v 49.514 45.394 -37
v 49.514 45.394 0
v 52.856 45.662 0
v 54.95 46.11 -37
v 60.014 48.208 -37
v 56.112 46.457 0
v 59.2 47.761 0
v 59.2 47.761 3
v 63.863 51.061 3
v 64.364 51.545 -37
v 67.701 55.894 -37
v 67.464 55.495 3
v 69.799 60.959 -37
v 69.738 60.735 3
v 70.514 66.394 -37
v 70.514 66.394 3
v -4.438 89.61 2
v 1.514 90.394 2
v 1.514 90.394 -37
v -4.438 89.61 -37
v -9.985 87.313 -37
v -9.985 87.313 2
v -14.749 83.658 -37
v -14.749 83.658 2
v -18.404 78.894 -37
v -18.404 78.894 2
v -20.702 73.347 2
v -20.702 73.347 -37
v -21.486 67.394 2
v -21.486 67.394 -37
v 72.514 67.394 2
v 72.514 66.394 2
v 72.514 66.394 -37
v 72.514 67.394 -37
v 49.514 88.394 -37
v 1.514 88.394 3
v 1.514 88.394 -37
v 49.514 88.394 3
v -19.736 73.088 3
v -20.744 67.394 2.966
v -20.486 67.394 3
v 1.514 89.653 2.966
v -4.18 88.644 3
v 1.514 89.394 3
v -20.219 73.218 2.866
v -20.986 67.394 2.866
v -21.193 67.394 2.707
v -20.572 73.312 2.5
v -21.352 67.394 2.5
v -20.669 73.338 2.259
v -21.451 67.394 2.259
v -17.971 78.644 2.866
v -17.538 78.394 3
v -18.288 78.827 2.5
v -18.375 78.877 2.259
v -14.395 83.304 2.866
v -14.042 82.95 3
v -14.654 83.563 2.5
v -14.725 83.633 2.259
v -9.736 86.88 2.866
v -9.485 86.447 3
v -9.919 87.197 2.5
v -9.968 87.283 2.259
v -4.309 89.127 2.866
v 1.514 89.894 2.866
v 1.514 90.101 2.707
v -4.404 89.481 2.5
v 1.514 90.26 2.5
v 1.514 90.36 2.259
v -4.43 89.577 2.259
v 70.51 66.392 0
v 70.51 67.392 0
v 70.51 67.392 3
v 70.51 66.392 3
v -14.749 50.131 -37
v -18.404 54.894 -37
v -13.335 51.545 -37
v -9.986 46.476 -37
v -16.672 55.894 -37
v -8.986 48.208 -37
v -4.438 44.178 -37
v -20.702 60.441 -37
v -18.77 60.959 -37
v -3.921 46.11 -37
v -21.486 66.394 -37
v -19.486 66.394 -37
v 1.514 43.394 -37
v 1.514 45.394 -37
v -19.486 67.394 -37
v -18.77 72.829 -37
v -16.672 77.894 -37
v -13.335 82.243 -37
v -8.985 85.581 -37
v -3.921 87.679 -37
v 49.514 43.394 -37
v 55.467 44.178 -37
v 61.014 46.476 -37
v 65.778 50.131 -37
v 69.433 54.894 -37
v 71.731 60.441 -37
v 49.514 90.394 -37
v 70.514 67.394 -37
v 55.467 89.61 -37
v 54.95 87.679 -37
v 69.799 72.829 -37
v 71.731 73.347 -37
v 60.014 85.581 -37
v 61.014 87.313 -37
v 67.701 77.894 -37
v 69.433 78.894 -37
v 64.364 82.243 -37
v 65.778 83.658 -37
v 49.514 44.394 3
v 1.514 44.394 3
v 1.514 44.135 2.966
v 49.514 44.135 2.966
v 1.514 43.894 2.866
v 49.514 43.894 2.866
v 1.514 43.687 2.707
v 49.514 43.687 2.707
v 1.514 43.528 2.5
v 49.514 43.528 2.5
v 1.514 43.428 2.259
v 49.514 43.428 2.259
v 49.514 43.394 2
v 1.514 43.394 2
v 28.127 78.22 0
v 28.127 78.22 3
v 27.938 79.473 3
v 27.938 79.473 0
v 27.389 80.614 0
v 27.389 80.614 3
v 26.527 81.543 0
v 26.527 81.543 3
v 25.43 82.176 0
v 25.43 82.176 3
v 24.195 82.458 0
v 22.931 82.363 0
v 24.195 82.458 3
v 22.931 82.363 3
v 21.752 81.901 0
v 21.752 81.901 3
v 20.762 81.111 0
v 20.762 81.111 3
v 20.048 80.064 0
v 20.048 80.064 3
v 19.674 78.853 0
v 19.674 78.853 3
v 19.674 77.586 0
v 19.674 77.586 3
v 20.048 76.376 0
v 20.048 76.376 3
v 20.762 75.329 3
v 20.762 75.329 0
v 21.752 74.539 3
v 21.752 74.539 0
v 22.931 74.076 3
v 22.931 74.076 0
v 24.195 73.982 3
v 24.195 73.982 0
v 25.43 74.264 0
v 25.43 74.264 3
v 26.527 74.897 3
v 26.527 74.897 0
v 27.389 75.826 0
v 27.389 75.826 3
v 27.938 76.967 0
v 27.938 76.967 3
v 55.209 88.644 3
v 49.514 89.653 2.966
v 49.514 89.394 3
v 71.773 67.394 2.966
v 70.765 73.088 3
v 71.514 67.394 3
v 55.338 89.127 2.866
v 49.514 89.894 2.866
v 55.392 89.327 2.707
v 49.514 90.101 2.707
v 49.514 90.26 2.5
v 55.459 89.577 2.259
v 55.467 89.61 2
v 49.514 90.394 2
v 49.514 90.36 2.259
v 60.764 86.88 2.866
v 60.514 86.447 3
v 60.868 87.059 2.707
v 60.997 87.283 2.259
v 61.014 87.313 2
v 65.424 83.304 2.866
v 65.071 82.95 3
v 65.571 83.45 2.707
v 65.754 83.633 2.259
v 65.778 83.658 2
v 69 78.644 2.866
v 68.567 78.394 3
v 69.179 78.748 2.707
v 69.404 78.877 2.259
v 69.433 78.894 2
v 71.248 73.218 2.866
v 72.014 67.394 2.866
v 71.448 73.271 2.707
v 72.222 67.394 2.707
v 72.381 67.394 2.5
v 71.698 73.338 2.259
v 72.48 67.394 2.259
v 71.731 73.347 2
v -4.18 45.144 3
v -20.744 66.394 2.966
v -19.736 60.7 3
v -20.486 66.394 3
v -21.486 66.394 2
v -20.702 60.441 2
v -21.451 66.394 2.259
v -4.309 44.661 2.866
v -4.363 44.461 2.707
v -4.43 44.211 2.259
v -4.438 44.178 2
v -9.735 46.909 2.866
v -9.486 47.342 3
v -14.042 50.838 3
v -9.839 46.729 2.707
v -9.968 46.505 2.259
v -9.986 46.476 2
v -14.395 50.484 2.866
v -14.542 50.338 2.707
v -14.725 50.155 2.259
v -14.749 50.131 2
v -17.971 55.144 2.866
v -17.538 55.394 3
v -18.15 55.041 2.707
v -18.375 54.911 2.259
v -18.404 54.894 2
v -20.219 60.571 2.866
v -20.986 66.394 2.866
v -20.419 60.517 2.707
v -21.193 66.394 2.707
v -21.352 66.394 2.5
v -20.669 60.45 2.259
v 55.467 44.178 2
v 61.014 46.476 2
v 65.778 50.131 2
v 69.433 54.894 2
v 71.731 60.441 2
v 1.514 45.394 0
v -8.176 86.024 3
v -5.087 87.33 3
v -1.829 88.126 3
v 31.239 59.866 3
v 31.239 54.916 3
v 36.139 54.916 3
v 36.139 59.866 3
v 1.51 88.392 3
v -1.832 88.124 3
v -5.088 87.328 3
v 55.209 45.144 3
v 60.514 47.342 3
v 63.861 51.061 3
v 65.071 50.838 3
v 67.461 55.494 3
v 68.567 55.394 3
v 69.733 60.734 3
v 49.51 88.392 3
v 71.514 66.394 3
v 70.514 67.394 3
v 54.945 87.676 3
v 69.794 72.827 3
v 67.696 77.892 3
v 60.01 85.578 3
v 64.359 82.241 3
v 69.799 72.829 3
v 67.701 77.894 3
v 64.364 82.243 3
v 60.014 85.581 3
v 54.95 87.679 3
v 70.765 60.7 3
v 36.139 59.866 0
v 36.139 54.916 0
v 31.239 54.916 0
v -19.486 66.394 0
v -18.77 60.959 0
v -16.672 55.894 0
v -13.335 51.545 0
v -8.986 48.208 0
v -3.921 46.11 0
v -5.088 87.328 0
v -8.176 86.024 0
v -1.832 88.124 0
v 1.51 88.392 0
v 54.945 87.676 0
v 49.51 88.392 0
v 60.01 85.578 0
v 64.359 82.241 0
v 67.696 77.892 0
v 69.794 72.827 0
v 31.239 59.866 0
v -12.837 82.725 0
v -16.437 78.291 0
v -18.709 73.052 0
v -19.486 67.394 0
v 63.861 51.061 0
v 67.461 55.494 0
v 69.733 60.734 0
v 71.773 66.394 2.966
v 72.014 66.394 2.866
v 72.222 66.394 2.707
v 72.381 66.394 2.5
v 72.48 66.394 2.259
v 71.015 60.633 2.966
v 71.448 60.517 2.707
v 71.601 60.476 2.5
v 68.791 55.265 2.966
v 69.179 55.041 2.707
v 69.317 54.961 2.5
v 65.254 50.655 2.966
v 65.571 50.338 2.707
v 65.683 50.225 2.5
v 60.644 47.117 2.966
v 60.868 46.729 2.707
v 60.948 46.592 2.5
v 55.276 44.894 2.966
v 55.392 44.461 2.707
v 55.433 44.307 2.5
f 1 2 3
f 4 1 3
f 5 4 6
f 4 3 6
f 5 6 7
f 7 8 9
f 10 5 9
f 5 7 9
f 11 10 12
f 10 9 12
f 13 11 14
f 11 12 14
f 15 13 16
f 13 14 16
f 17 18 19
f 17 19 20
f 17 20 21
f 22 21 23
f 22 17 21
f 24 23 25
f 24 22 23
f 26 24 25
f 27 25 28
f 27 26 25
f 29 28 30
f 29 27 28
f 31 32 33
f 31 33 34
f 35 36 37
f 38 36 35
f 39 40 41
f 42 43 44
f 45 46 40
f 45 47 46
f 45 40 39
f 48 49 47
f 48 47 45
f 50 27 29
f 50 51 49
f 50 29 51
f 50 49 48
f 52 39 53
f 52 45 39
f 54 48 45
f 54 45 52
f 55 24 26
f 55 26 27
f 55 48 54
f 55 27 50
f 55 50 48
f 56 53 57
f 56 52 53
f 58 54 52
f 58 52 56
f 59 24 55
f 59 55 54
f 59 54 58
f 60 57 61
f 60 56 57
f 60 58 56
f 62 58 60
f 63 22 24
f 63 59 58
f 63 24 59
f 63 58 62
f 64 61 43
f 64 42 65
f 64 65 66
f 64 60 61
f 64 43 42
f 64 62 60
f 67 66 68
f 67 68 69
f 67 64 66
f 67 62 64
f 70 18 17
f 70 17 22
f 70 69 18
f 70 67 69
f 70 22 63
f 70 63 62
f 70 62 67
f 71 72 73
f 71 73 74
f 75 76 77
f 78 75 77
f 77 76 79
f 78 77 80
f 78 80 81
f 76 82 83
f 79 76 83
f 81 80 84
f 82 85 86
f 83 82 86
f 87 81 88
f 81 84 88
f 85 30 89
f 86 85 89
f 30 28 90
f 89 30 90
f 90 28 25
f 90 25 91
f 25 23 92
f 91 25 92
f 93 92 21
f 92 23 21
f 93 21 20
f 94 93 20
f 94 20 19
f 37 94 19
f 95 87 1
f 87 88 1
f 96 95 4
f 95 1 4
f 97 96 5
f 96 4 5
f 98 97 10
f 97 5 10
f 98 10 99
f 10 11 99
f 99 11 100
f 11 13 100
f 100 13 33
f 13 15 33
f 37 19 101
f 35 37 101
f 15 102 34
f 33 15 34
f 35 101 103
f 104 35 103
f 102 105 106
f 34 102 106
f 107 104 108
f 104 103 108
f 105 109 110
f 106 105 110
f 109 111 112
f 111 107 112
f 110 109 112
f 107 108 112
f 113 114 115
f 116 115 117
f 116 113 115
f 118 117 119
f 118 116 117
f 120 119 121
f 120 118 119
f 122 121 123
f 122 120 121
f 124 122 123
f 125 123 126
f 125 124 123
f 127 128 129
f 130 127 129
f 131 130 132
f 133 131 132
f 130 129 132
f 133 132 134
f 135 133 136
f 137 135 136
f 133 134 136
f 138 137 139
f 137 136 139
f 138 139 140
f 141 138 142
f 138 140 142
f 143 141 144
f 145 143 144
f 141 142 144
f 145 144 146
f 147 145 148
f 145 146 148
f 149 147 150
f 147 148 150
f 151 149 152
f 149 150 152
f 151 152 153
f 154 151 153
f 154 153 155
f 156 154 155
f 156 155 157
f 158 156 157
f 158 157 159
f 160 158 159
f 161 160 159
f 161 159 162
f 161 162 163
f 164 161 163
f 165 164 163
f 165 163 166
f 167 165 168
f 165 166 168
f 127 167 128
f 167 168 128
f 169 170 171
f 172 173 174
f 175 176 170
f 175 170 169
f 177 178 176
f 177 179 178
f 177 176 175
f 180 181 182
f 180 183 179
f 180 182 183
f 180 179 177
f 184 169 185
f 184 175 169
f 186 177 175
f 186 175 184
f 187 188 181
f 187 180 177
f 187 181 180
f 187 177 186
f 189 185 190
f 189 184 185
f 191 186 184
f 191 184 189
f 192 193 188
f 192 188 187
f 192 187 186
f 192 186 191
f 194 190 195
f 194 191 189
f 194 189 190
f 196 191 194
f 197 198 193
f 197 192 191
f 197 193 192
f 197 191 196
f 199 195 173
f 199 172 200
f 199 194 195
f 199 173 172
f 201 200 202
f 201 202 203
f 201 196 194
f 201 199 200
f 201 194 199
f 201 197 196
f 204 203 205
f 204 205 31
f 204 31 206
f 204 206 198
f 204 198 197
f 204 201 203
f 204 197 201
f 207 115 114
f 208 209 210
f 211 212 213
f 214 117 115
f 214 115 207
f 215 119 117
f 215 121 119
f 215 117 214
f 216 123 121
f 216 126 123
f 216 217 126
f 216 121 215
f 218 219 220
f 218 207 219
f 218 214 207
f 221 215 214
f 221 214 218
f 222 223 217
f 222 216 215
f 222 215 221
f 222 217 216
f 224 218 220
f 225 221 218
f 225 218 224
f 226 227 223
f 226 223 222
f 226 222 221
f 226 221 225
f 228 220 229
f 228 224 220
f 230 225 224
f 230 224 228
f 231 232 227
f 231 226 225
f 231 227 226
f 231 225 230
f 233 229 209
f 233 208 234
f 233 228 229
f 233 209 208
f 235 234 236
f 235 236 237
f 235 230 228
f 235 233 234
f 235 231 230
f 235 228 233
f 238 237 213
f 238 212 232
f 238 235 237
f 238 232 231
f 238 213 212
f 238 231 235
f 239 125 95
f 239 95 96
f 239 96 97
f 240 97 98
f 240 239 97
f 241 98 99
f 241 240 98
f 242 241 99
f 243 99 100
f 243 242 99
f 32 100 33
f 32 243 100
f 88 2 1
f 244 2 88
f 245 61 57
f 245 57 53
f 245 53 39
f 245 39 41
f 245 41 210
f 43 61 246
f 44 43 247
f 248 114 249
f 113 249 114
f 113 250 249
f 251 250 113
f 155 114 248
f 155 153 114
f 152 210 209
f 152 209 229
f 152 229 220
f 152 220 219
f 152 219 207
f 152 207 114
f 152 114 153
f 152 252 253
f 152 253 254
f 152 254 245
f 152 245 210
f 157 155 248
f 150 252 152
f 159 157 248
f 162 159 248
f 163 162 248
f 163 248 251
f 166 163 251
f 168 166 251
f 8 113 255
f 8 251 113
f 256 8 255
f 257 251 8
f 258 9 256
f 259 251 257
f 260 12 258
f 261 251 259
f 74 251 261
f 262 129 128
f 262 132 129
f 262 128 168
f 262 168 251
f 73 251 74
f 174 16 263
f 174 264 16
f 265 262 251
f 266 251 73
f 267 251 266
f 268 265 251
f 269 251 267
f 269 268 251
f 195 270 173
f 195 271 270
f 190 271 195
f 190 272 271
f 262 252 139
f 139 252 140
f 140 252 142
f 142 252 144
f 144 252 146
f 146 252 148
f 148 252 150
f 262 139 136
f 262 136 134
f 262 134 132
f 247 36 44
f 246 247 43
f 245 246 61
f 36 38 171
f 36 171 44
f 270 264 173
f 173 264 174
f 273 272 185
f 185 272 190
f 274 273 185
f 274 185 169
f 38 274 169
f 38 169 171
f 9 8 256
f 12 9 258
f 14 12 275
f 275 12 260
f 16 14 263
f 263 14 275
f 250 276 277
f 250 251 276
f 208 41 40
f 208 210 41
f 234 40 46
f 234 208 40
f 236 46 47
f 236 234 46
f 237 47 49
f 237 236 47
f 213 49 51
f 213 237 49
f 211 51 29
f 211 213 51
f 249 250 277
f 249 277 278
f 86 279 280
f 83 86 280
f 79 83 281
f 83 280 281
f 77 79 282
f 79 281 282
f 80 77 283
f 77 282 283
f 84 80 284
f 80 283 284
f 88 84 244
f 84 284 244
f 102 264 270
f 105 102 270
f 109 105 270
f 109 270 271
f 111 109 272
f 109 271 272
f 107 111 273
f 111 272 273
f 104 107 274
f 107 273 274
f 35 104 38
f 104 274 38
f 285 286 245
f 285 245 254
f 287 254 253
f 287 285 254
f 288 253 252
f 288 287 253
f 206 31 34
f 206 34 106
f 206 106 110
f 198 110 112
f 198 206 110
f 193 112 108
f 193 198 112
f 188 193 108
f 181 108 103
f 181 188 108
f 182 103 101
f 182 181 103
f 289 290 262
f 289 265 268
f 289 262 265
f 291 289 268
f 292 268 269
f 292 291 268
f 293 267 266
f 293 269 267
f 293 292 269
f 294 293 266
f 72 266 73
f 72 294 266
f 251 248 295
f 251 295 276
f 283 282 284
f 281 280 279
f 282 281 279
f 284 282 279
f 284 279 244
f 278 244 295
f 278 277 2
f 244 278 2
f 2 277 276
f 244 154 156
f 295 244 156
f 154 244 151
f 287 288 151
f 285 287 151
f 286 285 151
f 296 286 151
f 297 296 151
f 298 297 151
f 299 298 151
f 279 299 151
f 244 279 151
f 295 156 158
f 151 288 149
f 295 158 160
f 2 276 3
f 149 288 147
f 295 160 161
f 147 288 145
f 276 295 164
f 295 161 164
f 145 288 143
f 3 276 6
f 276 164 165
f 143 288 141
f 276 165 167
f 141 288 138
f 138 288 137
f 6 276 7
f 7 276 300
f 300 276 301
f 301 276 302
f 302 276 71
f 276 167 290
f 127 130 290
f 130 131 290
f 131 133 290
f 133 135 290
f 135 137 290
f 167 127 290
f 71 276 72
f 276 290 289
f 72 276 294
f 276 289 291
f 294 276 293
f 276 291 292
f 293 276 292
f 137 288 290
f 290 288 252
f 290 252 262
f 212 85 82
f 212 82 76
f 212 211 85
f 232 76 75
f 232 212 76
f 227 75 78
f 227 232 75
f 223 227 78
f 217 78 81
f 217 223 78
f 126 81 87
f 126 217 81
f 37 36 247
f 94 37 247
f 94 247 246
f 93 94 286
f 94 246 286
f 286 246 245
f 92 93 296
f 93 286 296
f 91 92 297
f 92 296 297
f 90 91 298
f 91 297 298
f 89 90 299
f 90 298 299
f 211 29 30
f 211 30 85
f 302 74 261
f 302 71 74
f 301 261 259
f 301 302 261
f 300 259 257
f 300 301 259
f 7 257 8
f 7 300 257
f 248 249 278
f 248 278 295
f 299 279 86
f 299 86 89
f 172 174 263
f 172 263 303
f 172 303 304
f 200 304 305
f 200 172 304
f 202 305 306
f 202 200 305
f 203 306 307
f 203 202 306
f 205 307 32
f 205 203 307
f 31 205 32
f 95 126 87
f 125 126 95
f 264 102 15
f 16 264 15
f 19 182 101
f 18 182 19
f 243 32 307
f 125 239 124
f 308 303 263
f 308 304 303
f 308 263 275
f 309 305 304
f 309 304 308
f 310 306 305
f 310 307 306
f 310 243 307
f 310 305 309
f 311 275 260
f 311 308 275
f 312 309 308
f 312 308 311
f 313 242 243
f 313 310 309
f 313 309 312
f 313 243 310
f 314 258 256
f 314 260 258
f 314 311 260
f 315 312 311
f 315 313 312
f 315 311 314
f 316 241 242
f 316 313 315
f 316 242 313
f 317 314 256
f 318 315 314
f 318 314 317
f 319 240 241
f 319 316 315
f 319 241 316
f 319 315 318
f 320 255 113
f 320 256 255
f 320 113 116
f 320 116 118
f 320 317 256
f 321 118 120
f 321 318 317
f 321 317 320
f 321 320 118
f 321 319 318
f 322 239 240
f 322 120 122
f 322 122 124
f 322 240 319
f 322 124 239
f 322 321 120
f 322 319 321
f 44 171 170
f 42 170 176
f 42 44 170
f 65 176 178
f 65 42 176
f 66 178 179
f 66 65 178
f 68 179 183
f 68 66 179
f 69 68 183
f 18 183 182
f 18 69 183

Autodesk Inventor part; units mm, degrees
ref_plane "YZ Plane" through (0, 0, 0) normal (1, 0, 0) x (0, 1, 0)
ref_plane "XZ Plane" through (0, 0, 0) normal (0, 1, 0) x (-1, 0, 0)
ref_plane "XY Plane" through (0, 0, 0) normal (0, 0, 1) x (1, 0, 0)
sketch "Sketch1" plane through (0, 0, 0) normal (0, 0, 1) x (1, 0, 0)
  line L0 (1.5095, 88.3915) -> (49.5095, 88.3915)
  line L1 (70.5095, 67.3915) -> (70.5095, 66.3915)
  line L2 (49.5095, 45.3915) -> (1.5095, 45.3915)
  line L3 (-19.4905, 66.3915) -> (-19.4905, 67.3915)
  arc A0 (1.5095, 88.3915) -> (-19.4905, 67.3915) centre (1.5095, 67.3915) ccw
  arc A1 (-19.4905, 66.3915) -> (1.5095, 45.3915) centre (1.5095, 66.3915) ccw
  arc A2 (70.5095, 67.3915) -> (49.5095, 88.3915) centre (49.5095, 67.3915) ccw
  arc A3 (49.5095, 45.3915) -> (70.5095, 66.3915) centre (49.5095, 66.3915) ccw
  line L4 (49.5095, 90.3915) -> (1.5095, 90.3915)
  arc A4 (1.5095, 90.3915) -> (-21.4905, 67.3915) centre (1.5095, 67.3915) ccw
  line L5 (-21.4905, 67.3915) -> (-21.4905, 66.3915)
  arc A5 (-21.4905, 66.3915) -> (1.5095, 43.3915) centre (1.5095, 66.3915) ccw
  line L6 (1.5095, 43.3915) -> (49.5095, 43.3915)
  arc A6 (49.5095, 43.3915) -> (72.5095, 66.3915) centre (49.5095, 66.3915) ccw
  line L7 (72.5095, 66.3915) -> (72.5095, 67.3915)
  arc A7 (72.5095, 67.3915) -> (49.5095, 90.3915) centre (49.5095, 67.3915) ccw
  line L8 (1.5095, 45.3915) -> (49.5095, 45.3915)
  line L9 (49.5095, 45.3915) -> (49.5095, 88.3915)
  line L10 (49.5095, 88.3915) -> (1.5095, 88.3915)
  line L11 (1.5095, 88.3915) -> (1.5095, 45.3915)
  point P0 (0, 0)
  point P1 (-19.4905, 88.3915)
  point P2 (70.5095, 45.3915)
  point P3 (70.5095, 88.3915)
  point P4 (-19.4905, 66.8915)
  dimension "d0" = 90
  dimension "d1" = 43
  dimension "d2" = 21
  dimension "d3" = 21
  dimension "d6" = 2
  dimension "d36" = 48
extrude "Extrusion2" add sketch "Sketch1" along normal blind 3 contours L11 A1 L3 A0 | L0 L9 L2 L11 | A2 L1 A3 L9
sketch "Sketch5" plane through (0, 0, 3) normal (0, 0, 1) x (1, 0, 0)
  line L0 (1.5145, 88.3941) -> (49.5145, 88.3941)
  line L1 (70.5145, 67.3941) -> (70.5145, 66.3941)
  line L2 (49.5145, 45.3941) -> (1.5145, 45.3941)
  line L3 (-19.4855, 66.3941) -> (-19.4855, 67.3941)
  arc A0 (1.5145, 88.3941) -> (-19.4855, 67.3941) centre (1.5145, 67.3941) ccw
  arc A1 (-19.4855, 66.3941) -> (1.5145, 45.3941) centre (1.5145, 66.3941) ccw
  arc A2 (70.5145, 67.3941) -> (49.5145, 88.3941) centre (49.5145, 67.3941) ccw
  arc A3 (49.5145, 45.3941) -> (70.5145, 66.3941) centre (49.5145, 66.3941) ccw
  line L4 (49.5145, 90.3941) -> (1.5145, 90.3941)
  arc A4 (1.5145, 90.3941) -> (-21.4855, 67.3941) centre (1.5145, 67.3941) ccw
  line L5 (-21.4855, 67.3941) -> (-21.4855, 66.3941)
  arc A5 (-21.4855, 66.3941) -> (1.5145, 43.3941) centre (1.5145, 66.3941) ccw
  line L6 (1.5145, 43.3941) -> (49.5145, 43.3941)
  arc A6 (49.5145, 43.3941) -> (72.5145, 66.3941) centre (49.5145, 66.3941) ccw
  line L7 (72.5145, 66.3941) -> (72.5145, 67.3941)
  arc A7 (72.5145, 67.3941) -> (49.5145, 90.3941) centre (49.5145, 67.3941) ccw
  circle A8 centre (23.6625, 78.0591) radius 2.25
  line L8 (10.0145, 58.4841) -> (13.8145, 58.4841)
  line L9 (13.8145, 58.4841) -> (13.8145, 54.6841)
  line L10 (13.8145, 54.6841) -> (10.0145, 54.6841)
  line L11 (10.0145, 54.6841) -> (10.0145, 58.4841)
  point P0 (0, 0)
  point P1 (-69.6997, -39.2573)
  point P2 (-19.4855, 88.3941)
  point P3 (70.5145, 45.3941)
  point P4 (70.5145, 88.3941)
  point P5 (-19.4855, 66.8941)
  point P6 (10.0145, 56.5841)
  point P7 (11.9145, 54.6841)
  dimension "d16" = 90
  dimension "d17" = 43
  dimension "d18" = 21
  dimension "d19" = 21
  dimension "d20" = 2
  dimension "d21" = 4.5
  dimension "d22" = 3.8
  dimension "d23" = 29.5
  dimension "d24" = 9.29
  dimension "d25" = 3.8
  dimension "d26" = 43.148
  dimension "d27" = 10.335
extrude "Extrusion3" add sketch "Sketch5" against normal blind 40 contours A7 L7 A6 L6 A5 L5 A4 L4
fillet "Fillet1" radius 1 8 edges at (-21.4855, 66.8941, 3) (-14.7489, 50.1306, 3) (25.5145, 43.3941, 3) (65.778, 50.1306, 3) (72.5145, 66.8941, 3) (65.778, 83.6576, 3) (25.5145, 90.3941, 3) (-14.7489, 83.6576, 3)
sketch "Sketch7" plane through (0, 0, 3) normal (0, 0, 1) x (1, 0, 0)
  circle A0 centre (23.877, 78.2199) radius 0.1744
  circle A1 centre (23.877, 78.2199) radius 4.25
  line L0 (31.6393, 59.8664) -> (31.2393, 59.8664)
  line L1 (36.1393, 54.9164) -> (35.7393, 54.9164)
  line L2 (31.2393, 59.8664) -> (36.1393, 59.8664)
  line L3 (36.1393, 59.8664) -> (36.1393, 54.9164)
  line L4 (36.1393, 54.9164) -> (31.2393, 54.9164)
  line L5 (31.2393, 54.9164) -> (31.2393, 59.8664)
  line L6 (-2.1134, 89.7222) -> (57.8866, 89.7222)
  line L7 (57.8866, 89.7222) -> (57.8866, 49.7222)
  line L8 (57.8866, 49.7222) -> (-2.1134, 49.7222)
  line L9 (-2.1134, 49.7222) -> (-2.1134, 89.7222)
  point P0 (0, 0)
  point P1 (-83.2087, 35.9088)
  dimension "d40" = 8.5
  dimension "d41" = 60
  dimension "d42" = 40
extrude "Extrusion5" cut sketch "Sketch7" against normal blind 10 contours A0 | A1 | L2 L3 L1 L4 L5 L0
sketch "Sketch8" plane through (0, 0, 0) normal (0, 0, -1) x (-1, 0, 0)
  point P0 (0, 0)
properties part number "Front" material "Acetal Resin, Black"
